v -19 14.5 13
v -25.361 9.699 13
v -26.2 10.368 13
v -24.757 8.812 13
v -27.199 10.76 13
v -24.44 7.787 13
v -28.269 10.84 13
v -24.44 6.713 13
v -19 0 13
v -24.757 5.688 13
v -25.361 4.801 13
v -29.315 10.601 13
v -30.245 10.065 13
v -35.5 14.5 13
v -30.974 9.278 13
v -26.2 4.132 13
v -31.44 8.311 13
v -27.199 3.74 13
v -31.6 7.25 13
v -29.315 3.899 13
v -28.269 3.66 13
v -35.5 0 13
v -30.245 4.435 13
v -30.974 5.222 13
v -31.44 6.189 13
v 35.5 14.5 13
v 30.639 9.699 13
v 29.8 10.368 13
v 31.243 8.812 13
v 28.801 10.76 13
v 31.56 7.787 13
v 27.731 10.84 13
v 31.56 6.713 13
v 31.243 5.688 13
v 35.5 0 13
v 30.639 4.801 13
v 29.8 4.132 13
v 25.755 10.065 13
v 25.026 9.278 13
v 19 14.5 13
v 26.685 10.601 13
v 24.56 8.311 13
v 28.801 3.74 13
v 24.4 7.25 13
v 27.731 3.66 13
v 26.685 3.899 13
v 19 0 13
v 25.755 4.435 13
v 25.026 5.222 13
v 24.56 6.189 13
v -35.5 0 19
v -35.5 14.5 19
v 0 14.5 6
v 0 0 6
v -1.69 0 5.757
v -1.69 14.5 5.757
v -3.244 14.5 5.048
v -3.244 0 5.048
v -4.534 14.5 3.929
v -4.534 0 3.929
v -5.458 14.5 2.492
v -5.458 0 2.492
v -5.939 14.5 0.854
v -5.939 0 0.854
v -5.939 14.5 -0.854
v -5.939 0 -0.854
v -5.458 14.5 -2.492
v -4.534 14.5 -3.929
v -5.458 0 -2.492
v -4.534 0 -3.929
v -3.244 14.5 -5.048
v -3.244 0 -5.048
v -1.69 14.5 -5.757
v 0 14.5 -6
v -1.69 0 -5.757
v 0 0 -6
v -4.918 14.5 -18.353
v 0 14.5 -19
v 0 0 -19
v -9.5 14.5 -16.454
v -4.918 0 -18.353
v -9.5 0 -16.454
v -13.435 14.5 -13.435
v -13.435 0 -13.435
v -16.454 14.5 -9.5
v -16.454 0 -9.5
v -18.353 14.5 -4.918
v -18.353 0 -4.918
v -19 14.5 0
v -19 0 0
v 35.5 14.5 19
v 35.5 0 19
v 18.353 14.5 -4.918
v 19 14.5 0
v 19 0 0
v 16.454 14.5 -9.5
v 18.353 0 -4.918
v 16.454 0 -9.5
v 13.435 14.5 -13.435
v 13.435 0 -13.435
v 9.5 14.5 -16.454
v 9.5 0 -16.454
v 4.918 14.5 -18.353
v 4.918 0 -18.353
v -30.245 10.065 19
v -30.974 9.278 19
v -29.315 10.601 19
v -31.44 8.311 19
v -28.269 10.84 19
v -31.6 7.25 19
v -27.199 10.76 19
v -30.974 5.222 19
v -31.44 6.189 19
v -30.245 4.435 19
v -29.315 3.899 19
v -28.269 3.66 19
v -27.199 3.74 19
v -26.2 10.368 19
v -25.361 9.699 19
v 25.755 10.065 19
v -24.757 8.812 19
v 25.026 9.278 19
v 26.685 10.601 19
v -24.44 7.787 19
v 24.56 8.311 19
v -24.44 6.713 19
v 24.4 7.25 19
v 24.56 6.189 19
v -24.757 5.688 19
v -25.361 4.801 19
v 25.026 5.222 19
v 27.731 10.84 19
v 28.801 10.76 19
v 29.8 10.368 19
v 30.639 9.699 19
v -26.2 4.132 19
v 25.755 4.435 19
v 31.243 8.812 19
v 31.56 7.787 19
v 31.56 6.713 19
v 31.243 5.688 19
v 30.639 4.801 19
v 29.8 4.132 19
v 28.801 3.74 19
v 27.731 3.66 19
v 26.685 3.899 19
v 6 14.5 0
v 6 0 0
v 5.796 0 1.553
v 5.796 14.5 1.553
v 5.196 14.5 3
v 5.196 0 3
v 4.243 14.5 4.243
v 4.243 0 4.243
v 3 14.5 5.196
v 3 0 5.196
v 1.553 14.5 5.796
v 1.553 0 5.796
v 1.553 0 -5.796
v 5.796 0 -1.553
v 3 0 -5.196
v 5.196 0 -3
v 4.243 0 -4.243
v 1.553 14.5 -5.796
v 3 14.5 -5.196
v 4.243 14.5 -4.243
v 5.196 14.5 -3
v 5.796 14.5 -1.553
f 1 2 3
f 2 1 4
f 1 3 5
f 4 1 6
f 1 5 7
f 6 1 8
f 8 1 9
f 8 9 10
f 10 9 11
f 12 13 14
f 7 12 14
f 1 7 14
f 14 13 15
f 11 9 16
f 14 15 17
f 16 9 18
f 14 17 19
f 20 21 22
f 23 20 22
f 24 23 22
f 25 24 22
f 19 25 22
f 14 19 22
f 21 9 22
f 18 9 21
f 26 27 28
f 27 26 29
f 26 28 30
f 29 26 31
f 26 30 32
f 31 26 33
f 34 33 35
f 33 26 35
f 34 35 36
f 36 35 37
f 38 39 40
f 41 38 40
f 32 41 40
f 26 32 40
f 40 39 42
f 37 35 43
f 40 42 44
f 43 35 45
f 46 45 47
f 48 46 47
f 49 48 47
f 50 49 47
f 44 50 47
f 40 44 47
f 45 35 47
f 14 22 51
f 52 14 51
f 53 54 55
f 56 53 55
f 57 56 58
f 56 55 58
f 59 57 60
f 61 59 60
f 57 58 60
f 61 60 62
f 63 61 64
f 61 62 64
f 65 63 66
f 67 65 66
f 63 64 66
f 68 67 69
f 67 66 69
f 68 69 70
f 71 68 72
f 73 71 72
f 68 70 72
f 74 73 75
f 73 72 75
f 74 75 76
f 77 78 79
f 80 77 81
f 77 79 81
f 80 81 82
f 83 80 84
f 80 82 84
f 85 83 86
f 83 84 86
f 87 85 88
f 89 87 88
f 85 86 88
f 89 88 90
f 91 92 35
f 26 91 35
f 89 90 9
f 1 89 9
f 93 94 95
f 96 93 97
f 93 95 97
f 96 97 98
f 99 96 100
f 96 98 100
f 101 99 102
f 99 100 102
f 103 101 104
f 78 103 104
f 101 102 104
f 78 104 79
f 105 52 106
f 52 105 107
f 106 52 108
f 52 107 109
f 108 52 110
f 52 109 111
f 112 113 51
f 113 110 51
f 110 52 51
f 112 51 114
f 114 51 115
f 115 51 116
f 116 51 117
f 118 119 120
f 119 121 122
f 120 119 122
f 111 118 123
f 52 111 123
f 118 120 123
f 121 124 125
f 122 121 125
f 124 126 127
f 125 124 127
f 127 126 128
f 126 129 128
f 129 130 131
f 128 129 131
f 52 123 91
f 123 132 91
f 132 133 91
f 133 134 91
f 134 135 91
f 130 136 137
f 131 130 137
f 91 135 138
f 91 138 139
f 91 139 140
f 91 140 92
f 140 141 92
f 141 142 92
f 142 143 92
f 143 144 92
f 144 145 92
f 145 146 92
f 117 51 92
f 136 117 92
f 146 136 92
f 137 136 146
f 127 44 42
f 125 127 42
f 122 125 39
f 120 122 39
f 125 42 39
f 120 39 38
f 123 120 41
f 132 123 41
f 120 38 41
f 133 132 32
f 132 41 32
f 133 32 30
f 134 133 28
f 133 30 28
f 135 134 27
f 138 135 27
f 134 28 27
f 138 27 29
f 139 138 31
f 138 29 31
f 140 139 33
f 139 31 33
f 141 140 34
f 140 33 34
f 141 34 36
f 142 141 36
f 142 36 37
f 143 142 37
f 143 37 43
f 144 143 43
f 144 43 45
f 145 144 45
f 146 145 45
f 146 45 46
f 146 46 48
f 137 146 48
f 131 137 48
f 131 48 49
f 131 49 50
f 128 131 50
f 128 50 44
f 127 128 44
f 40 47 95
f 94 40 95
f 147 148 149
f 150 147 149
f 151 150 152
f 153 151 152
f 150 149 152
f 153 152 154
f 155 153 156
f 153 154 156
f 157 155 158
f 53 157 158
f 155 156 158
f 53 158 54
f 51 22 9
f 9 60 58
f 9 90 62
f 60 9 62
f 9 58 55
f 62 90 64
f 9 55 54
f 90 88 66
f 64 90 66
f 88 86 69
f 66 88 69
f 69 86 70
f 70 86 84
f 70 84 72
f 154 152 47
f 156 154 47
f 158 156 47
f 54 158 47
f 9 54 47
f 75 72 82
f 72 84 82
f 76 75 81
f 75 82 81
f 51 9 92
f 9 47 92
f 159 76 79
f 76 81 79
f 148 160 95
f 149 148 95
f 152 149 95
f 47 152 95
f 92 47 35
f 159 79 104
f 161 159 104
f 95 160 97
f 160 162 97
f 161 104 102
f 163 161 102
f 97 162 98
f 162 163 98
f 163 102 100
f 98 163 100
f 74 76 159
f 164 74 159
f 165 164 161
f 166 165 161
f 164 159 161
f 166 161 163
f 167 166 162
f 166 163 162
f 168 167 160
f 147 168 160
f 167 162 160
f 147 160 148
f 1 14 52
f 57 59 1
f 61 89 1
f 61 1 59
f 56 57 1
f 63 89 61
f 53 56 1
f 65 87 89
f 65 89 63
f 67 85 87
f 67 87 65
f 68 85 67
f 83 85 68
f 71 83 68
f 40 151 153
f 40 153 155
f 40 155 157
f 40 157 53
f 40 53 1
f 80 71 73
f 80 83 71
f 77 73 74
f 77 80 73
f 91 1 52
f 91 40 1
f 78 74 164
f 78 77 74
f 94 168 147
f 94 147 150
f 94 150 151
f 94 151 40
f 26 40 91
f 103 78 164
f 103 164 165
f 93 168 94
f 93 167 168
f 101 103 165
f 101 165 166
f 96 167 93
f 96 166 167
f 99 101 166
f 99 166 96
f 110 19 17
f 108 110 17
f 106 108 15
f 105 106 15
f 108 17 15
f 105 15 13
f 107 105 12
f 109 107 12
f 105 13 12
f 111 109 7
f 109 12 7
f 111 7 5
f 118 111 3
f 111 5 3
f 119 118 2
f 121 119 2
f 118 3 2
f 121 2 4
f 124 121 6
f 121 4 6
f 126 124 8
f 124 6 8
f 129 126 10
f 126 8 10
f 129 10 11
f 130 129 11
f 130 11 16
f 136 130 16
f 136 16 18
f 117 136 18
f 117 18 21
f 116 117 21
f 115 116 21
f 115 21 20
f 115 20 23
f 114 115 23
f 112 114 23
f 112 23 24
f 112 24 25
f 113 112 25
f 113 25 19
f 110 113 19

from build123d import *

# Parameters (mm, degrees)
EXTRUDE_2_DEPTH     = 14.5
SKETCH_2_R          = 3.6
CUT_EXTRUDE_1_DEPTH = 14.5


with BuildPart() as part:
    # 草图1 → 凸台-拉伸2 (new body)
    with BuildSketch(Plane(origin=(0, 0, 0), x_dir=(1, 0, 0), z_dir=(0, 1, 0))):
        with BuildLine():
            ThreePointArc((-13.856406461, -13), (-7.549834433, -17.435595775), (5e-09, -19))
            Line((0, -19), (0, -6))
            ThreePointArc((0, -6), (-6, 0), (0, 6))
            Line((0, 6), (0, 19))
            ThreePointArc((0, 19), (-13.435028843, 13.435028843), (-19, 0))
            ThreePointArc((-19, 0), (-17.667367132, -6.99028888), (-13.856406461, -13))
        make_face()
        with BuildLine():
            Line((0, -6), (0, -19))
            ThreePointArc((5e-09, -19), (7.549834438, -17.435595773), (13.856406461, -13))
            ThreePointArc((13.856406461, -13), (17.667367132, -6.99028888), (19, 0))
            ThreePointArc((19, 0), (13.435028843, 13.435028843), (0, 19))
            Line((0, 19), (0, 6))
            ThreePointArc((0, 6), (4.242640687, 4.242640687), (6, 0))
            ThreePointArc((6, 0), (4.242640687, -4.242640687), (0, -6))
        make_face()
        with BuildLine():
            Line((-19, -13), (-13.856406461, -13))
            ThreePointArc((-13.856406461, -13), (-17.667367132, -6.99028888), (-19, 0))
            Line((-19, 0), (-19, -13))
        make_face()
        with BuildLine():
            ThreePointArc((19, 0), (17.667367132, -6.99028888), (13.856406461, -13))
            Line((13.856406461, -13), (19, -13))
            Line((19, -13), (19, 0))
        make_face()
        with BuildLine():
            Line((5e-09, -19), (35.5, -19))
            Line((35.5, -19), (35.5, -13))
            Line((35.5, -13), (19, -13))
            Line((19, -13), (13.856406461, -13))
            ThreePointArc((13.856406461, -13), (7.549834438, -17.435595773), (5e-09, -19))
        make_face()
        with BuildLine():
            Line((-35.5, -19), (5e-09, -19))
            ThreePointArc((5e-09, -19), (-7.549834433, -17.435595775), (-13.856406461, -13))
            Line((-13.856406461, -13), (-19, -13))
            Line((-19, -13), (-35.5, -13))
            Line((-35.5, -13), (-35.5, -19))
        make_face()
    extrude(amount=EXTRUDE_2_DEPTH)

    # 草图2 → 切除-拉伸1 (cut)
    with BuildSketch(Plane(origin=(0, 0, 13), x_dir=(-1, 0, 0), z_dir=(0, 0, -1))):
        with Locations((-28, 7.25)):
            Circle(SKETCH_2_R)
        with Locations((28, 7.25)):
            Circle(SKETCH_2_R)
    extrude(amount=-CUT_EXTRUDE_1_DEPTH, mode=Mode.SUBTRACT)


solid = part.part
